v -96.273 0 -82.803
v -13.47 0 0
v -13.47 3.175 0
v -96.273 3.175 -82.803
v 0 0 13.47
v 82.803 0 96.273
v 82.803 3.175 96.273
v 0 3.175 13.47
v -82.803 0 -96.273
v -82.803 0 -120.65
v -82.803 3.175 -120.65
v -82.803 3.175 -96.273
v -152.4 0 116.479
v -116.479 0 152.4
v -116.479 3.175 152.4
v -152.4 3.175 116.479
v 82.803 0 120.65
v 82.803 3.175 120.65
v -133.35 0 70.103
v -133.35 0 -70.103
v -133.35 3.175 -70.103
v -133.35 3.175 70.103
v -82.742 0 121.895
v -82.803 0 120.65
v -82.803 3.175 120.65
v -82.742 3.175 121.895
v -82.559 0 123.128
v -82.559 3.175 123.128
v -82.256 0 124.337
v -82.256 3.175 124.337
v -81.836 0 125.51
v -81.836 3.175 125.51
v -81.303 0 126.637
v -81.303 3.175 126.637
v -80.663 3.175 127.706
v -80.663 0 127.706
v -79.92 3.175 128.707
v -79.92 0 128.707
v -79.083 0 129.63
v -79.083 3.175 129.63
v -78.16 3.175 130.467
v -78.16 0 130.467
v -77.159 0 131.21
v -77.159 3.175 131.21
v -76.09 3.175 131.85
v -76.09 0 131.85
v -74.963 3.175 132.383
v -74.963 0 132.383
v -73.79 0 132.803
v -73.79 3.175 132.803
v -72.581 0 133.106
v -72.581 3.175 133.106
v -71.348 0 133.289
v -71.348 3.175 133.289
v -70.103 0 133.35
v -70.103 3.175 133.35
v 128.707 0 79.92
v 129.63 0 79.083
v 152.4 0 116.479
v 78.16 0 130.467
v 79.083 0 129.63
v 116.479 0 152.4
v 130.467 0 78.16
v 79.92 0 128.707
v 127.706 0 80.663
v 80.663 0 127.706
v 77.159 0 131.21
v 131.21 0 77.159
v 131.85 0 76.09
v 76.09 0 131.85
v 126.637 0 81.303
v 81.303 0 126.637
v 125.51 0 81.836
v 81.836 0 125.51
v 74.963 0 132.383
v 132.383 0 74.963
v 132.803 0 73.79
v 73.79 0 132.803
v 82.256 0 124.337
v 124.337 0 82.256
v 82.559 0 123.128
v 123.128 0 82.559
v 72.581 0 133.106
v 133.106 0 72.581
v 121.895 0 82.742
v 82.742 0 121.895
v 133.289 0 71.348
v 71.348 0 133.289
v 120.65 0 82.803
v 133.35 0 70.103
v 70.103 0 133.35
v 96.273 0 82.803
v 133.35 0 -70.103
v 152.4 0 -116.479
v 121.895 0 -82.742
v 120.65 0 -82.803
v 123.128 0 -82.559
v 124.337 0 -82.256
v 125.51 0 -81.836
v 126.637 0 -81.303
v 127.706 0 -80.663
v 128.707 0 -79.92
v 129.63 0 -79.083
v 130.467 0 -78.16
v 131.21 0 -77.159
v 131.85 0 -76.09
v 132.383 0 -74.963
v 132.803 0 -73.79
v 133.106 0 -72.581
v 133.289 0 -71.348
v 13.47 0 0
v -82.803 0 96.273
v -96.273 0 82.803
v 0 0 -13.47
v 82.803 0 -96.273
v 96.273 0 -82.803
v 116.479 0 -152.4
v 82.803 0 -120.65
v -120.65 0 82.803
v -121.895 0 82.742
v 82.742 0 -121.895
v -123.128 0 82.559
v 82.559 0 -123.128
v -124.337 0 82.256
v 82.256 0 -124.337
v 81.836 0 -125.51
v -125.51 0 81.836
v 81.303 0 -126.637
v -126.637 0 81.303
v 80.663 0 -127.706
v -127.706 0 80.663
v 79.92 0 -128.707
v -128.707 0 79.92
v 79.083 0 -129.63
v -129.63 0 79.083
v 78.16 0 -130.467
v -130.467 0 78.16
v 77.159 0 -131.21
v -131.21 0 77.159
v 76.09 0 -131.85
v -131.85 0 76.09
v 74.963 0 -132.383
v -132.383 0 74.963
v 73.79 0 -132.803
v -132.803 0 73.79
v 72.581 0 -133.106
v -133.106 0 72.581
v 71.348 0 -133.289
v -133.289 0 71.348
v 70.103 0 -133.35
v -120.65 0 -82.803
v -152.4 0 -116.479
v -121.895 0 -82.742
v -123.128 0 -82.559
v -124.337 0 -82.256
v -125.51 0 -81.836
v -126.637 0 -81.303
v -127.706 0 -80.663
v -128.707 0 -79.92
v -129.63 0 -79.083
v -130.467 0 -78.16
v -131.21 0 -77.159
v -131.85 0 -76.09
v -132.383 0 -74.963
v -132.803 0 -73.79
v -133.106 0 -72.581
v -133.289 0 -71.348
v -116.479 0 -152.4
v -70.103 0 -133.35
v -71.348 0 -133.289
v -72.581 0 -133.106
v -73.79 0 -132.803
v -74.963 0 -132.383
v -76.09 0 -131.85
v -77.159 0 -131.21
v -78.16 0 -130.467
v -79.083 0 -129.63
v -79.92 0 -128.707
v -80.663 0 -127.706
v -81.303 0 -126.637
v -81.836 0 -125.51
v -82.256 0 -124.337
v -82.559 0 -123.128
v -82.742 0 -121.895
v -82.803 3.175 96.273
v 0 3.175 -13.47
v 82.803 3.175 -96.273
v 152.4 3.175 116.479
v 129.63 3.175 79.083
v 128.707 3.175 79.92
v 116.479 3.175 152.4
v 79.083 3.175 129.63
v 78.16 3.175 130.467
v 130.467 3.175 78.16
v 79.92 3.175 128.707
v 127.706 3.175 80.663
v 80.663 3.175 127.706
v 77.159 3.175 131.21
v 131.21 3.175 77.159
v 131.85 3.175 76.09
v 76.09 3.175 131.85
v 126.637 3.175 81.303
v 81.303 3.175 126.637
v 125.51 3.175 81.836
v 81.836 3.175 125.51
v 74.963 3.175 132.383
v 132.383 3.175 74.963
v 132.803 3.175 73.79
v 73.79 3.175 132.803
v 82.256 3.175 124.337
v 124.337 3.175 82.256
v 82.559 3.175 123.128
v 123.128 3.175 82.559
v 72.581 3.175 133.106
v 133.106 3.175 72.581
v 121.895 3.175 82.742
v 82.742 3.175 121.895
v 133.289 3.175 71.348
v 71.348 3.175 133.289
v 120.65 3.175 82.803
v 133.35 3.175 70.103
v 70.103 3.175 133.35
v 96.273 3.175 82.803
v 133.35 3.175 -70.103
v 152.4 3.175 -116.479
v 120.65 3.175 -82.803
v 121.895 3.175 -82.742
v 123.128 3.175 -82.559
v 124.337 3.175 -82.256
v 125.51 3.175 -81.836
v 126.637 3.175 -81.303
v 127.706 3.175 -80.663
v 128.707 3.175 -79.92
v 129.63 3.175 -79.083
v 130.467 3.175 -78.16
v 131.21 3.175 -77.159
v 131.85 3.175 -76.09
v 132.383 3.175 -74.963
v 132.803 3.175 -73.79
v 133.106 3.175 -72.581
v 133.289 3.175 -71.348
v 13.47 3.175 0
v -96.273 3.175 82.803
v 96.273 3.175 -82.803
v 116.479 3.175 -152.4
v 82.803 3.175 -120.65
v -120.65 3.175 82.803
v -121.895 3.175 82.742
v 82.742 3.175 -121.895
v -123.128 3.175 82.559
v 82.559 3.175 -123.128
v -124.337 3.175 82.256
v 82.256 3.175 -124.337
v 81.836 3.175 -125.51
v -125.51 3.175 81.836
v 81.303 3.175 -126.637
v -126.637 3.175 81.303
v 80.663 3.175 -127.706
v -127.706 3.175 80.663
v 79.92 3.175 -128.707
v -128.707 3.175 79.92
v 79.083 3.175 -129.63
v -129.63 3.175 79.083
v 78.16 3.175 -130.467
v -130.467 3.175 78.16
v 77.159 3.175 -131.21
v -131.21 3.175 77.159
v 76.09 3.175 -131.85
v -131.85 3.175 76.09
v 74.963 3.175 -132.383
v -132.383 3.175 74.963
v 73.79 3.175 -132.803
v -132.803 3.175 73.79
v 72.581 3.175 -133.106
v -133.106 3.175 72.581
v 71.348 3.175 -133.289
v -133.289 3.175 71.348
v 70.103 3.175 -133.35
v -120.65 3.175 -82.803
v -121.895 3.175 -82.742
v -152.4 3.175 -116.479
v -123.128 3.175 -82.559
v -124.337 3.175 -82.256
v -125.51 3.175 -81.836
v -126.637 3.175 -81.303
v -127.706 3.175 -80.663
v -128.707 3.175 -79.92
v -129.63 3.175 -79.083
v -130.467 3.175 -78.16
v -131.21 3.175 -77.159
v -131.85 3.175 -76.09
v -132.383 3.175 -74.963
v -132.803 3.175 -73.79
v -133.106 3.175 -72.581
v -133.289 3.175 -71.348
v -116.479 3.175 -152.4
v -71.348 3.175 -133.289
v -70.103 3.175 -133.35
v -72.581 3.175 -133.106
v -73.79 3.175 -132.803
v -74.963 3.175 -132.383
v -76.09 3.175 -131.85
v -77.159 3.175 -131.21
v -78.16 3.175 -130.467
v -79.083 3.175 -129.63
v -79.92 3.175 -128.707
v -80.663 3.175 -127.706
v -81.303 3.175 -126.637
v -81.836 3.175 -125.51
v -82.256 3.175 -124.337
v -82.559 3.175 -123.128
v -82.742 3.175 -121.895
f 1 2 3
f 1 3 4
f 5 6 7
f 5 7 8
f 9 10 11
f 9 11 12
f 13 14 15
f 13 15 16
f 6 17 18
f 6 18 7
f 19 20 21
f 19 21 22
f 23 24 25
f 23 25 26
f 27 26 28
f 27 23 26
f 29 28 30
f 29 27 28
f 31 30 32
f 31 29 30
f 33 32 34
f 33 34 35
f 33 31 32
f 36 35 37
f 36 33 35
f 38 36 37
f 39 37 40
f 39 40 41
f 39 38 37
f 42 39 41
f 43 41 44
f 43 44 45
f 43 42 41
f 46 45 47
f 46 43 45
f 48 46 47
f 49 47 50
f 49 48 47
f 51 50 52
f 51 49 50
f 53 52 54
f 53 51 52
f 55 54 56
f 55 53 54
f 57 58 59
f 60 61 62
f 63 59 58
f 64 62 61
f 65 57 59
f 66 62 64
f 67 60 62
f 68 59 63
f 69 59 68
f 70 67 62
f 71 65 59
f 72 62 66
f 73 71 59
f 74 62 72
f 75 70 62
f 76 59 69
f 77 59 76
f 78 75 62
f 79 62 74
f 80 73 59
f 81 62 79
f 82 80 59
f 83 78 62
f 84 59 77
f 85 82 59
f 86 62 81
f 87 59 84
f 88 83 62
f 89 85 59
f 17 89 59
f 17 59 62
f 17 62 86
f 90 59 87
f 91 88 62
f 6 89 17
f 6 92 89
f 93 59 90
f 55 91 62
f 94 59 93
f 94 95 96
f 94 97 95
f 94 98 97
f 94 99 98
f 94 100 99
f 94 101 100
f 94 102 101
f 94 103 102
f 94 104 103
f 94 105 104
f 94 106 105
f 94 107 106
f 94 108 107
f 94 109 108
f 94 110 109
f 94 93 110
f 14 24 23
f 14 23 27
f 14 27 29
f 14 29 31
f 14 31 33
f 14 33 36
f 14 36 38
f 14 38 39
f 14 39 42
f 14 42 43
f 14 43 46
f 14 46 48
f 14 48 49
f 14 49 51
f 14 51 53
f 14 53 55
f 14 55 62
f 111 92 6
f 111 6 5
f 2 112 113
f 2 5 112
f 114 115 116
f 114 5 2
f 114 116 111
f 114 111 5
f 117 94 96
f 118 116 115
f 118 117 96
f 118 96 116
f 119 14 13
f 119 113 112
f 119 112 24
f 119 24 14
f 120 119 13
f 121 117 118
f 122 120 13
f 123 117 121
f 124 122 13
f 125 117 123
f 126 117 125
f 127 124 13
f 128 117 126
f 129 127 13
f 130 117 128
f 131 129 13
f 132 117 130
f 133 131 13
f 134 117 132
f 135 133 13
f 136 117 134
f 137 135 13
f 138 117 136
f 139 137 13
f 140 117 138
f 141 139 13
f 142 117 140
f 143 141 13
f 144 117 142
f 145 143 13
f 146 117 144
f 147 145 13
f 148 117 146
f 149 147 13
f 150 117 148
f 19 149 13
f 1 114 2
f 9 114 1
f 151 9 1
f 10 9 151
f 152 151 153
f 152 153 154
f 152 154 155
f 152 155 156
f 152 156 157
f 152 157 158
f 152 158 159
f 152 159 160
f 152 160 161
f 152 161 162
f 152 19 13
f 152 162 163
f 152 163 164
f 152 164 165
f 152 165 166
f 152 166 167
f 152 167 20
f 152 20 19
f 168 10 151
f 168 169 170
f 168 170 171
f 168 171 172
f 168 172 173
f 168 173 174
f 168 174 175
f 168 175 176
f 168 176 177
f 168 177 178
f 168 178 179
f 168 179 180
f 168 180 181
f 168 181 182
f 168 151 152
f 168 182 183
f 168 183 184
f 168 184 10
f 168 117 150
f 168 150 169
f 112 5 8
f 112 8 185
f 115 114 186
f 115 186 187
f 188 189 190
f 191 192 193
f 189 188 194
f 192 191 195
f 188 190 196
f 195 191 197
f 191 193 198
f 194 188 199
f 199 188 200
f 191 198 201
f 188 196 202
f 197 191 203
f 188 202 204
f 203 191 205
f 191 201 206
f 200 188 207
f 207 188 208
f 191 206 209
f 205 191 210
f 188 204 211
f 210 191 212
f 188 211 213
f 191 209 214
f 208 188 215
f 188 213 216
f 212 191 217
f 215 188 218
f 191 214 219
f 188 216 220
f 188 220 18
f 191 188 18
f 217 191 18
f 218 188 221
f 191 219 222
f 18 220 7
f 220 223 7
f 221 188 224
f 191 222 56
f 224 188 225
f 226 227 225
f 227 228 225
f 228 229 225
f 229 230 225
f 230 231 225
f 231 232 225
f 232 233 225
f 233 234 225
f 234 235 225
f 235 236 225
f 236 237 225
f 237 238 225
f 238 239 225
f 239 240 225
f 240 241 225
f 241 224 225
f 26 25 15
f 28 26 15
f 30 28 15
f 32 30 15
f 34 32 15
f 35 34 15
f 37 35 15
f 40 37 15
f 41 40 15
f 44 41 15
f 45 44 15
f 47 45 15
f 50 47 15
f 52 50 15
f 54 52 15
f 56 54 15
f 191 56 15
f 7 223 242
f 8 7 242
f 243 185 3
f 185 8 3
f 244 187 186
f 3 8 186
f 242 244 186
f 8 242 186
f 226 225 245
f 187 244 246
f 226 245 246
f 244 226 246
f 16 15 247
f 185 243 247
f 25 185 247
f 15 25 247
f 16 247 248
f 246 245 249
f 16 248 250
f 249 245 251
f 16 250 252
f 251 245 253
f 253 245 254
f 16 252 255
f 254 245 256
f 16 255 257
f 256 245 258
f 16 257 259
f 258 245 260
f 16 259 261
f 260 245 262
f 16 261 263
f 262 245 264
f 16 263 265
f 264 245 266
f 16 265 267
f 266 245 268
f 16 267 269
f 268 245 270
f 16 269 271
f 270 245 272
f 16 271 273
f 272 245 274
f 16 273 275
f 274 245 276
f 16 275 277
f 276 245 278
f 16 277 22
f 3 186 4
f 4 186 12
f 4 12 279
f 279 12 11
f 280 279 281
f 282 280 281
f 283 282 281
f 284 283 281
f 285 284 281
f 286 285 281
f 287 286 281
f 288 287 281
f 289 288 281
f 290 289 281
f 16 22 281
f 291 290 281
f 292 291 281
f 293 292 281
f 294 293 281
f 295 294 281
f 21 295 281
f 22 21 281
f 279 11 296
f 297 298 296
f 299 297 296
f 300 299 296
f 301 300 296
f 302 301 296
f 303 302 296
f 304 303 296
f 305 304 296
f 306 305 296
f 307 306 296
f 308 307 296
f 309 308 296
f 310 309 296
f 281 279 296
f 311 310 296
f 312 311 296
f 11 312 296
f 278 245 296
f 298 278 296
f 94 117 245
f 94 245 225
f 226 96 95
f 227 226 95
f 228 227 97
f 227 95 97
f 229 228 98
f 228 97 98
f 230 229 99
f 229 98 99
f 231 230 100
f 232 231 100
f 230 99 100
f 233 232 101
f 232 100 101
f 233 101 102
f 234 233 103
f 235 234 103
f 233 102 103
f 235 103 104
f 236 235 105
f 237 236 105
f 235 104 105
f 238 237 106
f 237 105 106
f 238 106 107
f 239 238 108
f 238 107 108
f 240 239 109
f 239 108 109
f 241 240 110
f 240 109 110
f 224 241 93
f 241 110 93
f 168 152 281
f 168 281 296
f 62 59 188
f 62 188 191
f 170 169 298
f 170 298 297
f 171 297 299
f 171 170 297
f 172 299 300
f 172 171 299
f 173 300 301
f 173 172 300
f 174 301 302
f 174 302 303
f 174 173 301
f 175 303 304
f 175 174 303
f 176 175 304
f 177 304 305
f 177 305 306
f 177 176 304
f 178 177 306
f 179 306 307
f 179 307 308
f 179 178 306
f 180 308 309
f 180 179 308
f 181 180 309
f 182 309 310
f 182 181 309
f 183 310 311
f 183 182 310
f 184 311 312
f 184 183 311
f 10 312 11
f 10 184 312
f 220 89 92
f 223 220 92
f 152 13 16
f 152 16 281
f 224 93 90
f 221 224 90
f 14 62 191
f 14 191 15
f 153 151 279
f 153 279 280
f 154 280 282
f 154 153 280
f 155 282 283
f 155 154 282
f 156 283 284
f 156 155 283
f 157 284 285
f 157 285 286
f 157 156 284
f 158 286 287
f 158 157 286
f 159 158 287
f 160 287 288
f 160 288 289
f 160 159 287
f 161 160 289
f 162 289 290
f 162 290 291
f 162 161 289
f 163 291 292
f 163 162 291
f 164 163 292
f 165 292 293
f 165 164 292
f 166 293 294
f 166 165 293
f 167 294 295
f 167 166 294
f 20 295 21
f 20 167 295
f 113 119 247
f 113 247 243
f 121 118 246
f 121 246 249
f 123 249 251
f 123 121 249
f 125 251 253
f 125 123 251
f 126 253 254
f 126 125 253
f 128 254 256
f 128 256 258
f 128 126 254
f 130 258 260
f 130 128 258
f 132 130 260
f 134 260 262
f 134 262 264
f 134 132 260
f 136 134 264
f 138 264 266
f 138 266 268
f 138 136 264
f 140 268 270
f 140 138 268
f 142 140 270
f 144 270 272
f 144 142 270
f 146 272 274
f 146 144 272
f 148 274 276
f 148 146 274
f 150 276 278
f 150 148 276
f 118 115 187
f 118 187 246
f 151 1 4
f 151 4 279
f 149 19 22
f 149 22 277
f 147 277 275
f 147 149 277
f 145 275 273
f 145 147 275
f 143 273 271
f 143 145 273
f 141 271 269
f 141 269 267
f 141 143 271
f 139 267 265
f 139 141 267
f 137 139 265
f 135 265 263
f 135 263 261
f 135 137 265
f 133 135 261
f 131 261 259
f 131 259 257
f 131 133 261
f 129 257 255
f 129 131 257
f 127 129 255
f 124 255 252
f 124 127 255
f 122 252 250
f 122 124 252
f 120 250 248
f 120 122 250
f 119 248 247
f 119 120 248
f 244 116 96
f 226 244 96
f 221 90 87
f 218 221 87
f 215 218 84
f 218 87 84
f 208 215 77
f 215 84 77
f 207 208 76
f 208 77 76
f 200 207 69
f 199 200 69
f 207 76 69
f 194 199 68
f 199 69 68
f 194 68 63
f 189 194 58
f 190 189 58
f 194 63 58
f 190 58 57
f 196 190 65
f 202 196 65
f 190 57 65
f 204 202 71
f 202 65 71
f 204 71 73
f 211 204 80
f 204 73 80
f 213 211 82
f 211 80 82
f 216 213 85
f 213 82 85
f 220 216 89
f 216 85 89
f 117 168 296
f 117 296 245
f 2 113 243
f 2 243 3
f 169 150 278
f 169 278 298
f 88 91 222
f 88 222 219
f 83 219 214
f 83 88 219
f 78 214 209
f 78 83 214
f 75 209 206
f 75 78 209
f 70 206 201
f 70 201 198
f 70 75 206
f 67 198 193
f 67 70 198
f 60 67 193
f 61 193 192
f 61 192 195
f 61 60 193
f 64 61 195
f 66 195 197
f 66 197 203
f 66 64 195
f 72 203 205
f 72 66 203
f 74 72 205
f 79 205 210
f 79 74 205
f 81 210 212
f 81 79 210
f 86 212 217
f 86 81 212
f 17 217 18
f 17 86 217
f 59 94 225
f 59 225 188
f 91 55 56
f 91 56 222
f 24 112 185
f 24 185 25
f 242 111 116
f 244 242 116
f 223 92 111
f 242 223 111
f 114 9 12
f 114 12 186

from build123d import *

# Parameters (mm, degrees)
BOSS_EXTRUDE1_DEPTH = 3.175


with BuildPart() as part:
    # Sketch2 → Boss-Extrude1 (new body)
    with BuildSketch(Plane(origin=(0, 0, 0), x_dir=(1, 0, 0), z_dir=(0, 1, 0))):
        Polygon((-152.4, 116.478975516), (-116.478975516, 152.4), (116.478975516, 152.4), (152.4, 116.478975516), (152.4, -116.478975516), (116.478975516, -152.4), (-116.478975516, -152.4), (-152.4, -116.478975516), align=None)
        with BuildLine():
            Line((-82.803015062, 96.273399243), (0, 13.470384182))
            Line((0, 13.470384182), (82.803015062, 96.273399243))
            Line((82.803015062, 96.273399243), (82.803015062, 120.65))
            ThreePointArc((82.803015062, 120.65), (79.083271183, 129.630256121), (70.103015062, 133.35))
            Line((70.103015062, 133.35), (-70.103015062, 133.35))
            ThreePointArc((-70.103015062, 133.35), (-79.083271183, 129.630256121), (-82.803015062, 120.65))
            Line((-82.803015062, 120.65), (-82.803015062, 96.273399243))
        make_face(mode=Mode.SUBTRACT)
        with BuildLine():
            Line((-133.35, 70.103015062), (-133.35, -70.103015062))
            ThreePointArc((-133.35, -70.103015062), (-129.630256121, -79.083271183), (-120.65, -82.803015062))
            Line((-120.65, -82.803015062), (-96.273399243, -82.803015062))
            Line((-96.273399243, -82.803015062), (-13.470384182, 0))
            Line((-13.470384182, 0), (-96.273399243, 82.803015062))
            Line((-96.273399243, 82.803015062), (-120.65, 82.803015062))
            ThreePointArc((-120.65, 82.803015062), (-129.630256121, 79.083271183), (-133.35, 70.103015062))
        make_face(mode=Mode.SUBTRACT)
        with BuildLine():
            Line((96.273399243, 82.803015062), (120.65, 82.803015062))
            ThreePointArc((120.65, 82.803015062), (129.630256121, 79.083271183), (133.35, 70.103015062))
            Line((133.35, 70.103015062), (133.35, -70.103015062))
            ThreePointArc((133.35, -70.103015062), (129.630256121, -79.083271183), (120.65, -82.803015062))
            Line((120.65, -82.803015062), (96.273399243, -82.803015062))
            Line((96.273399243, -82.803015062), (13.470384182, 0))
            Line((13.470384182, 0), (96.273399243, 82.803015062))
        make_face(mode=Mode.SUBTRACT)
        with BuildLine():
            Line((-70.103015062, -133.35), (70.103015062, -133.35))
            ThreePointArc((70.103015062, -133.35), (79.083271183, -129.630256121), (82.803015062, -120.65))
            Line((82.803015062, -120.65), (82.803015062, -96.273399243))
            Line((82.803015062, -96.273399243), (0, -13.470384182))
            Line((0, -13.470384182), (-82.803015062, -96.273399243))
            Line((-82.803015062, -96.273399243), (-82.803015062, -120.65))
            ThreePointArc((-82.803015062, -120.65), (-79.083271183, -129.630256121), (-70.103015062, -133.35))
        make_face(mode=Mode.SUBTRACT)
    extrude(amount=BOSS_EXTRUDE1_DEPTH)


solid = part.part
